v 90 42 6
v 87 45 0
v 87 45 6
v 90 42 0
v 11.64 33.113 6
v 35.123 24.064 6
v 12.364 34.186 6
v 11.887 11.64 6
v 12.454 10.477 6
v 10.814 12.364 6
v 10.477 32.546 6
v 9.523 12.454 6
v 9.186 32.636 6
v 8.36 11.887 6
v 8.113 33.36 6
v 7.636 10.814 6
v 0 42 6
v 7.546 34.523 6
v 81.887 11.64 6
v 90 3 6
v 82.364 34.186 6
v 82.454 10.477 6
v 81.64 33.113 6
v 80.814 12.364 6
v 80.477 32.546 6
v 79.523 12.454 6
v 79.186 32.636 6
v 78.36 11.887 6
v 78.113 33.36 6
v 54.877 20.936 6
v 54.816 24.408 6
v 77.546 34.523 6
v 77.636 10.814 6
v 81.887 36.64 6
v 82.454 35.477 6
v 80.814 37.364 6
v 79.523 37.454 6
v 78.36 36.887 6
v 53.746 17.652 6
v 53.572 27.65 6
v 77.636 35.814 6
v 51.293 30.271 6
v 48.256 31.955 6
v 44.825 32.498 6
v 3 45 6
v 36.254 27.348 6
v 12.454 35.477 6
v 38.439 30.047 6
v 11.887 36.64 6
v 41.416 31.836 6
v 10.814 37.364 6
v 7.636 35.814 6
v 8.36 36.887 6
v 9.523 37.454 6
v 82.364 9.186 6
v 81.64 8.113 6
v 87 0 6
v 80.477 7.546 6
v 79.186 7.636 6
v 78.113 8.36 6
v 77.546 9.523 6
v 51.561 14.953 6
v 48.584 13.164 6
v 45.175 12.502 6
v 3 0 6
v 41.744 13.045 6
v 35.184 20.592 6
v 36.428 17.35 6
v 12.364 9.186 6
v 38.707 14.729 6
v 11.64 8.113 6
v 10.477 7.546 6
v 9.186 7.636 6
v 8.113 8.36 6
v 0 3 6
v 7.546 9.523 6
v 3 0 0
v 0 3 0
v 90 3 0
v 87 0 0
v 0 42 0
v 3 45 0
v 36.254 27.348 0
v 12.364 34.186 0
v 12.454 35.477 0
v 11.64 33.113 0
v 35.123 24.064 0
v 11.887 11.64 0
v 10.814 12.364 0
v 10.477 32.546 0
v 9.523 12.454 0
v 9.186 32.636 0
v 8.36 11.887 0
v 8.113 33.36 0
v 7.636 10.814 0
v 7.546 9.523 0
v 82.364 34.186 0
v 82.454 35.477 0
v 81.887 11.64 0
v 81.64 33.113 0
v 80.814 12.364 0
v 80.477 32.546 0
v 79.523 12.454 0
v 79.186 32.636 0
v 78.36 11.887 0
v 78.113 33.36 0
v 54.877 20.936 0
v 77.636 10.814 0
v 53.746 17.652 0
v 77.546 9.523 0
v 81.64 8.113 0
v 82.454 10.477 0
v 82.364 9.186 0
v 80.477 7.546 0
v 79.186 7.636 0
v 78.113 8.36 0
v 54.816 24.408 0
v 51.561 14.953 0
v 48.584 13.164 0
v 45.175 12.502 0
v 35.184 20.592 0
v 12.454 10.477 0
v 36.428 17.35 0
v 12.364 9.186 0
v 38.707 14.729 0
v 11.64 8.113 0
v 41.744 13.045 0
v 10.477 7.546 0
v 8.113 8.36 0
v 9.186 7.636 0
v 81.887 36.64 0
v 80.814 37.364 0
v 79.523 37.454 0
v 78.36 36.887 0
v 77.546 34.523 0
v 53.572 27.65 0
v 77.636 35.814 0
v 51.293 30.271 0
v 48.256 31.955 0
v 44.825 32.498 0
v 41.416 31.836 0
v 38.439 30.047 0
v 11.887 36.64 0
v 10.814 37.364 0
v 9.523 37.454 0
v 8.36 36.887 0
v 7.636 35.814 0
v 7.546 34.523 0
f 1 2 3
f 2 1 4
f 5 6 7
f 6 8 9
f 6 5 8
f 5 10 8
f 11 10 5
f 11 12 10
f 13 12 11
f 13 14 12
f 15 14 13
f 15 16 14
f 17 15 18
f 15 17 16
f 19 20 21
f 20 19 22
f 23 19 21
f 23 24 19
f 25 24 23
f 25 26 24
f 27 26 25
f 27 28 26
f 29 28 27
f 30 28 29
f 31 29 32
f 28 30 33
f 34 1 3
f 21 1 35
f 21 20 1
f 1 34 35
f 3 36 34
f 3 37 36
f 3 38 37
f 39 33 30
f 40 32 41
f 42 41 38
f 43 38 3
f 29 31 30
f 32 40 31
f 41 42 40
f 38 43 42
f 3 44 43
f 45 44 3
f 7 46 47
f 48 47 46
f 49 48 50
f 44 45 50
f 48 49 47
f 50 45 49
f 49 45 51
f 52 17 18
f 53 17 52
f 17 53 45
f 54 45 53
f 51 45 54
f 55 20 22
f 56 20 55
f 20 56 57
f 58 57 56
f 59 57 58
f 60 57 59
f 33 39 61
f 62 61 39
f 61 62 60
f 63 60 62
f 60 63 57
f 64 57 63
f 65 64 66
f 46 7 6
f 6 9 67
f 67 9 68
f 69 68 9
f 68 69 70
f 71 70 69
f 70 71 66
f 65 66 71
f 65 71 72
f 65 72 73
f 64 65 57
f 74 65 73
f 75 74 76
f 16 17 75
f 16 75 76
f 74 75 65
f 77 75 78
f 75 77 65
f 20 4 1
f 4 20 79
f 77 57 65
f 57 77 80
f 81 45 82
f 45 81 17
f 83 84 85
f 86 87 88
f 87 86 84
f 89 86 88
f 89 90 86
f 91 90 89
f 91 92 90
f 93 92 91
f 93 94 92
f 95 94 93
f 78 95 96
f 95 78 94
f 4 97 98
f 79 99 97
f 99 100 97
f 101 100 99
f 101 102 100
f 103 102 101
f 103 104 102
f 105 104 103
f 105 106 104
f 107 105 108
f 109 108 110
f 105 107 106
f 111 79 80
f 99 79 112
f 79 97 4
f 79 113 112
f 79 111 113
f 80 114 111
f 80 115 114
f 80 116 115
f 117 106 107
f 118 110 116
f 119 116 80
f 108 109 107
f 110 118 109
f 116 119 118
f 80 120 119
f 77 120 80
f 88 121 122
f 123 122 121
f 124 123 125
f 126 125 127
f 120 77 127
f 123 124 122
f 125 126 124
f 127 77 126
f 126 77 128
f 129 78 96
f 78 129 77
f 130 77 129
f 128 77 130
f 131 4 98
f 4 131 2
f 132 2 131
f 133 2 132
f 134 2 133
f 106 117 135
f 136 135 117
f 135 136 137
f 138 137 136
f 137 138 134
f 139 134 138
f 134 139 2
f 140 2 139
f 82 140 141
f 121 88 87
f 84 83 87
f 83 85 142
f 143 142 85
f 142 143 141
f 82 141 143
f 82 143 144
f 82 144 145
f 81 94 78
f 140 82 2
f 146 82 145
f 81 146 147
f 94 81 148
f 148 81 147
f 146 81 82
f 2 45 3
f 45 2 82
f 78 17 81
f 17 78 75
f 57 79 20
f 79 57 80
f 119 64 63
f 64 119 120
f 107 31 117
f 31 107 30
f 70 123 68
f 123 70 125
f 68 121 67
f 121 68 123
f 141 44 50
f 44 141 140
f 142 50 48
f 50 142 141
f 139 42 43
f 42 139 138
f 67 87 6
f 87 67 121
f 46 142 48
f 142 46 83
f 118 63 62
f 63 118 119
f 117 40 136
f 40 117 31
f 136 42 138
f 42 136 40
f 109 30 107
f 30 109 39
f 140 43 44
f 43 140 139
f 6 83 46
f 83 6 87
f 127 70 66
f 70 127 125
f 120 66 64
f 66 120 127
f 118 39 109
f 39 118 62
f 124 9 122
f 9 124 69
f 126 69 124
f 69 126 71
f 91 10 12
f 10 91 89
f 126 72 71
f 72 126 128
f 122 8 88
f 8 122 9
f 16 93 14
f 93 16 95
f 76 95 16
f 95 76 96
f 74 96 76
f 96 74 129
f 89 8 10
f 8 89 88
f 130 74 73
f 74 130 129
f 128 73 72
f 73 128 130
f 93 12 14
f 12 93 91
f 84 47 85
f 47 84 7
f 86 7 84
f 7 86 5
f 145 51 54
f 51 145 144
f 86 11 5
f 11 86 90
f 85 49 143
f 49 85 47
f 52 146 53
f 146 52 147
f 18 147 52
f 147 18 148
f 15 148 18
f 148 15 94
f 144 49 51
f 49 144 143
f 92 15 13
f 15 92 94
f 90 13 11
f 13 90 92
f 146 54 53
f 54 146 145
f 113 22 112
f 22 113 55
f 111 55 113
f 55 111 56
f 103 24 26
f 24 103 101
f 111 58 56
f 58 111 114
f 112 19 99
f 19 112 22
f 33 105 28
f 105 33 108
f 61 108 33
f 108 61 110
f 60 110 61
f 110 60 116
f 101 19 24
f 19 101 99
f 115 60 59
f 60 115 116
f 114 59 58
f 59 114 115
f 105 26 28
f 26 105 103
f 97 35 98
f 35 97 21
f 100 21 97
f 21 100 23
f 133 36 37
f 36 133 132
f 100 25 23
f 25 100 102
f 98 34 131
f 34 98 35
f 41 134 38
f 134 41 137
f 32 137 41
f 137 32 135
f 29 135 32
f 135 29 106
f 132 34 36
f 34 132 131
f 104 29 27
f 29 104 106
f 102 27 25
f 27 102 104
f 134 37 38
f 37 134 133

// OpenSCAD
$fn = 32;

// ----------------------------------------------------------------------
// Spacer plate: rect 90 x 45
// ----------------------------------------------------------------------

// --- parameters (mm) ---
bore_r = 10;              // centre bore radius
bolt_r = 2.5;             // bolt hole radius
plate_t = 6;              // plate thickness, Z (extrusion height)
plate_l = 90;             // plate length, X
plate_w = 45;             // plate width, Y
inset = 10;               // corner hole inset

profile = [[3, 0], [87, 0], [90, 3], [90, 42], [87, 45], [3, 45], [0, 42], [0, 3]];  // primary outline, 8 points, counter clockwise
void_1 = [[54.816, 24.408], [53.572, 27.65], [51.293, 30.271], [48.256, 31.955], [44.825, 32.498], [41.416, 31.836], [38.439, 30.047], [36.254, 27.348], [35.123, 24.064], [35.184, 20.592], [36.428, 17.35], [38.707, 14.729], [41.744, 13.045], [45.175, 12.502], [48.584, 13.164], [51.561, 14.953], [53.746, 17.652], [54.877, 20.936]];  // centre bore, 18 points
void_2 = [[12.454, 10.477], [11.887, 11.64], [10.814, 12.364], [9.523, 12.454], [8.36, 11.887], [7.636, 10.814], [7.546, 9.523], [8.113, 8.36], [9.186, 7.636], [10.477, 7.546], [11.64, 8.113], [12.364, 9.186]];  // corner hole, 12 points
void_3 = [[12.454, 35.477], [11.887, 36.64], [10.814, 37.364], [9.523, 37.454], [8.36, 36.887], [7.636, 35.814], [7.546, 34.523], [8.113, 33.36], [9.186, 32.636], [10.477, 32.546], [11.64, 33.113], [12.364, 34.186]];  // corner hole, 12 points
void_4 = [[82.454, 10.477], [81.887, 11.64], [80.814, 12.364], [79.523, 12.454], [78.36, 11.887], [77.636, 10.814], [77.546, 9.523], [78.113, 8.36], [79.186, 7.636], [80.477, 7.546], [81.64, 8.113], [82.364, 9.186]];  // corner hole, 12 points
void_5 = [[82.454, 35.477], [81.887, 36.64], [80.814, 37.364], [79.523, 37.454], [78.36, 36.887], [77.636, 35.814], [77.546, 34.523], [78.113, 33.36], [79.186, 32.636], [80.477, 32.546], [81.64, 33.113], [82.364, 34.186]];  // corner hole, 12 points

// --- the one profile operation ---
difference() {
  linear_extrude(height = plate_t) polygon(points = profile);
  translate([0, 0, -1])
    linear_extrude(height = plate_t + 2) polygon(points = void_1);
  translate([0, 0, -1])
    linear_extrude(height = plate_t + 2) polygon(points = void_2);
  translate([0, 0, -1])
    linear_extrude(height = plate_t + 2) polygon(points = void_3);
  translate([0, 0, -1])
    linear_extrude(height = plate_t + 2) polygon(points = void_4);
  translate([0, 0, -1])
    linear_extrude(height = plate_t + 2) polygon(points = void_5);
}
